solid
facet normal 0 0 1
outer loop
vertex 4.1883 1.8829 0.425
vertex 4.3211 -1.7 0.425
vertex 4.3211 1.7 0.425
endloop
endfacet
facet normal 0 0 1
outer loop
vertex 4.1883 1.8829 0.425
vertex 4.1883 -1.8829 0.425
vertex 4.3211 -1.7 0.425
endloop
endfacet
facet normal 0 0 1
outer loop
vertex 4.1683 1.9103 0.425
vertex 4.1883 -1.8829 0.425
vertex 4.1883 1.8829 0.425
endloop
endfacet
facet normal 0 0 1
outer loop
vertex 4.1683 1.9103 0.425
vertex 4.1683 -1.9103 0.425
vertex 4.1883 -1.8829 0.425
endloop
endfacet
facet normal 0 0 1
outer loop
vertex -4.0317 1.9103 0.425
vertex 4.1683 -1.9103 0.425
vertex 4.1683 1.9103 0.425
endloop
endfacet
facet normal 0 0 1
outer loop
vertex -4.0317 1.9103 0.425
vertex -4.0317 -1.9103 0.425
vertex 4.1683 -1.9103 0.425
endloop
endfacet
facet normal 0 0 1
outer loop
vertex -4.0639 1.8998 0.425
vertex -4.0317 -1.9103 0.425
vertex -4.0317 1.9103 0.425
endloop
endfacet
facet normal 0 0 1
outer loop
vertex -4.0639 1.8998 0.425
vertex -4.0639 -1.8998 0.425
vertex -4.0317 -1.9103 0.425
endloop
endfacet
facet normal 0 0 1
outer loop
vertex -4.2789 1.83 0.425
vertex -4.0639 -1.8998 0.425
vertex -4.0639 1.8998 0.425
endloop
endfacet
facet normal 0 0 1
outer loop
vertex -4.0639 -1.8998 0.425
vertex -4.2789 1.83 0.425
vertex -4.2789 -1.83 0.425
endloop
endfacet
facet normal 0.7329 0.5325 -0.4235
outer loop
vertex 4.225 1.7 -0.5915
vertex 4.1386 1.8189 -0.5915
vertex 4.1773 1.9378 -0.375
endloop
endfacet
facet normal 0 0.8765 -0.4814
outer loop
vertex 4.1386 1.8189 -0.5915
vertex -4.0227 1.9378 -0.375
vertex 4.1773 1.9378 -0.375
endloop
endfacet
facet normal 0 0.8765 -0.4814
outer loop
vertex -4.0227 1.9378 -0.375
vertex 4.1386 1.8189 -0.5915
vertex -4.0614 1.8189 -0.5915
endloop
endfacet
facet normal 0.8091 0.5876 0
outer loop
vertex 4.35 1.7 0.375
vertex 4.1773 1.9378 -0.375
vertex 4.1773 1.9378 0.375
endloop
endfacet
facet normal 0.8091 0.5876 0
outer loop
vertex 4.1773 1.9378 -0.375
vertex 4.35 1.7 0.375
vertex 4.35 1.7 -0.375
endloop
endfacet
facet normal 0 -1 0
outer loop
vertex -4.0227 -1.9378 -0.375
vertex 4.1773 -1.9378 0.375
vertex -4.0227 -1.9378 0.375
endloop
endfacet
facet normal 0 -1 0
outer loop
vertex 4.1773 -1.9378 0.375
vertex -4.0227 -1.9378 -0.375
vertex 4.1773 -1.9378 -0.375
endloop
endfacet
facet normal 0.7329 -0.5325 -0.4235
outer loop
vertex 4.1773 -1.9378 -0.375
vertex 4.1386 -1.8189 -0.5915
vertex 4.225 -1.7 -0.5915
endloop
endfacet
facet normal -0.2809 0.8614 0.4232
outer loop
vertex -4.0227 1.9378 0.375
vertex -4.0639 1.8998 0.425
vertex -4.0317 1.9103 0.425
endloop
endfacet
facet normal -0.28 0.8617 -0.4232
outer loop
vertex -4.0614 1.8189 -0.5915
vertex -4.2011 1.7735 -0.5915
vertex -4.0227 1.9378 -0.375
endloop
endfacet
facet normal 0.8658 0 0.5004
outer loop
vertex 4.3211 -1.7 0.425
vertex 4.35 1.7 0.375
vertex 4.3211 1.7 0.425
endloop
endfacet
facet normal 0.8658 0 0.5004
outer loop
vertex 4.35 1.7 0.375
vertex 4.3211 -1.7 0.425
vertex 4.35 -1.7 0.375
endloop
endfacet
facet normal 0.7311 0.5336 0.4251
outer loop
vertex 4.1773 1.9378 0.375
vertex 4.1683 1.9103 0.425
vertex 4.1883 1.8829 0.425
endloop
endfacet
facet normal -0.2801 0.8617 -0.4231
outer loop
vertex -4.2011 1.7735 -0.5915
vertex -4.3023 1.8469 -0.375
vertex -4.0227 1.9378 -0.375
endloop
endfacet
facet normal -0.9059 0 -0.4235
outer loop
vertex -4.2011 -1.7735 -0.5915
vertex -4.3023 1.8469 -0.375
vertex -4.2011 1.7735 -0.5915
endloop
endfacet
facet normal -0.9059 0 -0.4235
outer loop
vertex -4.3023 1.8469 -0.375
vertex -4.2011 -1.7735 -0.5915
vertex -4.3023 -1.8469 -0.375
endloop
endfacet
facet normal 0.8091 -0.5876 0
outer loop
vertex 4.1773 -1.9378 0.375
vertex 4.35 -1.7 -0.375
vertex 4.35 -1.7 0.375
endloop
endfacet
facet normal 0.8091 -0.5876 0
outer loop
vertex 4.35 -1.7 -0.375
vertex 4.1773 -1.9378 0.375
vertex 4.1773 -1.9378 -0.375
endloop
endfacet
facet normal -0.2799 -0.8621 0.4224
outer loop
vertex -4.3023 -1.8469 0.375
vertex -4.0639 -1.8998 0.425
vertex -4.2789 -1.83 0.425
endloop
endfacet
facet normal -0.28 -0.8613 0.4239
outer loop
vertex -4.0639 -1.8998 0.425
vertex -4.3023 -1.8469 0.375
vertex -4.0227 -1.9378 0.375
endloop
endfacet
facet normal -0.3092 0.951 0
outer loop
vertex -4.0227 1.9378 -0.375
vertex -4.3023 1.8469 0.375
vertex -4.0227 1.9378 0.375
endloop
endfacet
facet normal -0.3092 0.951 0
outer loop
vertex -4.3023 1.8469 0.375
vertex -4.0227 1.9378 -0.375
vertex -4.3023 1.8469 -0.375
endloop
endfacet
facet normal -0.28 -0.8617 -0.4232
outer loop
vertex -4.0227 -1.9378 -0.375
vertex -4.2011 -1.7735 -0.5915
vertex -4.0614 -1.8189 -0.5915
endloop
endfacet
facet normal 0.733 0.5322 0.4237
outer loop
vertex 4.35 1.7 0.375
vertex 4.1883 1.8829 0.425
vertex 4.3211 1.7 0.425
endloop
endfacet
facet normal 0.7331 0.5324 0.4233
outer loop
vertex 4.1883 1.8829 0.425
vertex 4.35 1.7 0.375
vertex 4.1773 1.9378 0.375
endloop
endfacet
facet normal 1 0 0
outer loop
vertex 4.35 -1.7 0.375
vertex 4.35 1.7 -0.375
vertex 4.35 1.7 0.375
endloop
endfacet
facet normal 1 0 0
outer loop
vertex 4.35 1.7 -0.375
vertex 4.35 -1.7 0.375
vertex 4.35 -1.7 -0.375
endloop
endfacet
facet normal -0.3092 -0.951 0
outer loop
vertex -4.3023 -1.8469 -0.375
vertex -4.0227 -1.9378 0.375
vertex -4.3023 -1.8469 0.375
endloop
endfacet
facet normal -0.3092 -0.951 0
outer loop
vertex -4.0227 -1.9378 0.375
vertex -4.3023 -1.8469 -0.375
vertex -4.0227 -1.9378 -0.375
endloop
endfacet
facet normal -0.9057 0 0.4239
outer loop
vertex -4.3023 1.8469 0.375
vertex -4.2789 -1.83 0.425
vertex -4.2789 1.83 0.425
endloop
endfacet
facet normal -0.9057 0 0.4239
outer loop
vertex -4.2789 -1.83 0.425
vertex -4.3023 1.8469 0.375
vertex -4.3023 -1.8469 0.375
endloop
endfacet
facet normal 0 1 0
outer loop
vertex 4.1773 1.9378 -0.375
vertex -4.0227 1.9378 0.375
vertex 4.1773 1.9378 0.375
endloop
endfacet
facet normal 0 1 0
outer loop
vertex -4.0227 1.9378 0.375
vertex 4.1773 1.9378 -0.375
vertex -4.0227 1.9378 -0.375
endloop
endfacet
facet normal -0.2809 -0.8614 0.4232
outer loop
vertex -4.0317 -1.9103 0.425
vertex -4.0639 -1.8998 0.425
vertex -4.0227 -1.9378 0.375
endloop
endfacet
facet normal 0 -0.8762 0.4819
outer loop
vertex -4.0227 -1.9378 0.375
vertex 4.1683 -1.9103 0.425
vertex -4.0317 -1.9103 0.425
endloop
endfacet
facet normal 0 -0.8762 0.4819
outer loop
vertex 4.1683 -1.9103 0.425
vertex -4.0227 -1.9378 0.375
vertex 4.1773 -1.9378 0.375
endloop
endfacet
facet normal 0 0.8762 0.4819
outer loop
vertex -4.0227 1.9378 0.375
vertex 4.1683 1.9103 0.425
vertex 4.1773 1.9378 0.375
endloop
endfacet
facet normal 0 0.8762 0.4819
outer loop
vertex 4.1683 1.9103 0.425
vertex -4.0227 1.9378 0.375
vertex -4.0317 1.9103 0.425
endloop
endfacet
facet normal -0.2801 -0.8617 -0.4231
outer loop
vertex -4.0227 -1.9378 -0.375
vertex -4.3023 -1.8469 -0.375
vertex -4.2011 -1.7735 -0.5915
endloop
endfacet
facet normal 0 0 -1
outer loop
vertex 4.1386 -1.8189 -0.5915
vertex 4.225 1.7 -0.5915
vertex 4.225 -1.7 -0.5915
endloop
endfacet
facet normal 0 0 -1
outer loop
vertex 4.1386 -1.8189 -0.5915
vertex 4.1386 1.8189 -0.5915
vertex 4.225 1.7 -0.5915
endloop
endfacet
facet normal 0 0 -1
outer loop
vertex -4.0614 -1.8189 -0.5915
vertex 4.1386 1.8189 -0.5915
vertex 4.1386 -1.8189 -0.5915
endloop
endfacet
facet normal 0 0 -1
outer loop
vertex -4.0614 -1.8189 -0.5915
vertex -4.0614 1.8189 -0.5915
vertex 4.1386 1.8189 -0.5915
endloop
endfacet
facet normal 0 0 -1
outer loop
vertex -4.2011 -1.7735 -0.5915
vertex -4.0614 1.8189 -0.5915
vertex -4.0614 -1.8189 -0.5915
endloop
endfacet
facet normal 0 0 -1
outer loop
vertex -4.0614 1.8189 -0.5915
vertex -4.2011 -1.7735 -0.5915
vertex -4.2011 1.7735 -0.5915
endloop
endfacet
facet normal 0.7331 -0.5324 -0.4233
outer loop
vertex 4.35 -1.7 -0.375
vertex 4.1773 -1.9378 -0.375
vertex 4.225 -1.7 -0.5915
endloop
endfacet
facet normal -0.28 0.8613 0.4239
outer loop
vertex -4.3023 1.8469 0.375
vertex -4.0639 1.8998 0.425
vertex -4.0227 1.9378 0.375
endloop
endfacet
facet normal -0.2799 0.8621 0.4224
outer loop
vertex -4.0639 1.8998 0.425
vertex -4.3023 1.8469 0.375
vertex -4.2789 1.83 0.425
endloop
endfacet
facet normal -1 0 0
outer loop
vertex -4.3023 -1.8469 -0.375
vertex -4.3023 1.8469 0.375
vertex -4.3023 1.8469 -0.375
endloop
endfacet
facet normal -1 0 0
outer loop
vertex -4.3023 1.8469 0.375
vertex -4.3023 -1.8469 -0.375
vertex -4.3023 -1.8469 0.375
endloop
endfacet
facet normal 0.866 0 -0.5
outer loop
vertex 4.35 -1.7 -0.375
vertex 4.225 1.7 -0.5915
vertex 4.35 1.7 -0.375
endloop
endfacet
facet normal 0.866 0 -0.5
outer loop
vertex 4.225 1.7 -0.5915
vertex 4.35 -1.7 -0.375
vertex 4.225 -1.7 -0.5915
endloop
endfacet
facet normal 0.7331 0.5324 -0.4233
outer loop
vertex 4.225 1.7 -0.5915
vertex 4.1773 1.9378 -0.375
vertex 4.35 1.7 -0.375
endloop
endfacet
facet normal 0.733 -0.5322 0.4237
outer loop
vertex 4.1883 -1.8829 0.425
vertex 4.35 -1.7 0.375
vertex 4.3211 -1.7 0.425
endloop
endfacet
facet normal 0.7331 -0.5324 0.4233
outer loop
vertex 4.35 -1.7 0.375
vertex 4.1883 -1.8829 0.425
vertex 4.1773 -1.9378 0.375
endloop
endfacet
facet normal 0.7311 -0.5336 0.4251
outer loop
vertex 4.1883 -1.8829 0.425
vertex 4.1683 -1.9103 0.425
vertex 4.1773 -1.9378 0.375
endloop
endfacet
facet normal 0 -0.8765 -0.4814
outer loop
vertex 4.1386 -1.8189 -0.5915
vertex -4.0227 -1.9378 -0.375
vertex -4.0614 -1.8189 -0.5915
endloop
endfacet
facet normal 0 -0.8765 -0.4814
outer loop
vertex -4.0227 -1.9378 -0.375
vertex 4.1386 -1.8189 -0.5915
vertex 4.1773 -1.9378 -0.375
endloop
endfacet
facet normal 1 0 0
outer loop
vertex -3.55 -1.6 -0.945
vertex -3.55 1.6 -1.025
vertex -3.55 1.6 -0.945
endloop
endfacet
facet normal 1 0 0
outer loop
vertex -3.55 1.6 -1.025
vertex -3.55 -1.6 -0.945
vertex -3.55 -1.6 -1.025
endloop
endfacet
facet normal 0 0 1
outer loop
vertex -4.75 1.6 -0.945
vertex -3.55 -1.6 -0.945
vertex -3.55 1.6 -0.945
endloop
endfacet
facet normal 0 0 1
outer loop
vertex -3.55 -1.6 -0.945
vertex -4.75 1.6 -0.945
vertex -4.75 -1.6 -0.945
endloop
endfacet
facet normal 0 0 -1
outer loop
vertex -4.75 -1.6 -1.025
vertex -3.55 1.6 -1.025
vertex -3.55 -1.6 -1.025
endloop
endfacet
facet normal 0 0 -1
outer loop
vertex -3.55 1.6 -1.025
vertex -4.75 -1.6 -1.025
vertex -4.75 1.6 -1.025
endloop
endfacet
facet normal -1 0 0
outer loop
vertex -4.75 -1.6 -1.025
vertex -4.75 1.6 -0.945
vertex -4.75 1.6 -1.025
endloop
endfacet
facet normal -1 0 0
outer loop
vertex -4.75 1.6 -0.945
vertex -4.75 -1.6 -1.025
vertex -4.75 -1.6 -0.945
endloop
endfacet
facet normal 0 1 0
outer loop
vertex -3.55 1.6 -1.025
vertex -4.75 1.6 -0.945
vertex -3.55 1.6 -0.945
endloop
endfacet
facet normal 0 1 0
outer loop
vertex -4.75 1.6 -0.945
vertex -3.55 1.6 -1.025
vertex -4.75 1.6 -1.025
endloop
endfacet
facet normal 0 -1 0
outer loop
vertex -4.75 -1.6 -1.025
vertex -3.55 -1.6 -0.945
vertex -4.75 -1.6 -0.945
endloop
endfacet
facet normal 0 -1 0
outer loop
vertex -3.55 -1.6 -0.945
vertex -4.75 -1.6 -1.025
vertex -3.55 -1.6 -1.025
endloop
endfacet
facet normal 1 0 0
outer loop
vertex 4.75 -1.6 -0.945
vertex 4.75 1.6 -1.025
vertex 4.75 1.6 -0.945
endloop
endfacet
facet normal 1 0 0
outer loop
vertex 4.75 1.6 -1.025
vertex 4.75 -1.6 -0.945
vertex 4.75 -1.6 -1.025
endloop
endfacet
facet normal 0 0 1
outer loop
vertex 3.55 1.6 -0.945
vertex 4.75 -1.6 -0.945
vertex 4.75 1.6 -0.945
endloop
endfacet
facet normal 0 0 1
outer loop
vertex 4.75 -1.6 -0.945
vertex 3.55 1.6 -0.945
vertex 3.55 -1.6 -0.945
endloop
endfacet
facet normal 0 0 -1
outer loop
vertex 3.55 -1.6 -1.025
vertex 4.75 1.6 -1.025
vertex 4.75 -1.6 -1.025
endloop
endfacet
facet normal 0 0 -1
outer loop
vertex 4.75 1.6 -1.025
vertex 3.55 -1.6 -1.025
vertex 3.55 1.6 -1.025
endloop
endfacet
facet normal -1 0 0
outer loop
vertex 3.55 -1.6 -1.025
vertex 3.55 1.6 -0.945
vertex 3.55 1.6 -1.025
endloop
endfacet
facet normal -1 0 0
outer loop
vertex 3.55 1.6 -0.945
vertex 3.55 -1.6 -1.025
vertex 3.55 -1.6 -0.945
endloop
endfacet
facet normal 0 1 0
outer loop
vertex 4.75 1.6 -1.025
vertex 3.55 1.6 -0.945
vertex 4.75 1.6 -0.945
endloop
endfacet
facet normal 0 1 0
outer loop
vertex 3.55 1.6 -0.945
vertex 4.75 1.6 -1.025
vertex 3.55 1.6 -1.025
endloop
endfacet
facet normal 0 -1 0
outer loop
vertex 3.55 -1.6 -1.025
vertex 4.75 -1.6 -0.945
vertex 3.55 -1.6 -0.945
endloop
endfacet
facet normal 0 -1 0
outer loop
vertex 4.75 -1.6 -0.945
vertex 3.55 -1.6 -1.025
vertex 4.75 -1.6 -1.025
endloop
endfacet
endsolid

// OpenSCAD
// Parameters
body_L = 8.7; //[4.35:17.4:0.05]
body_W = 3.9; //[1.95:7.8:0.05]
body_H = 1.25; //[0.625:2.5:0.05]
edge_fillet_r = 0.25; //[0.1:0.6:0.05]
top_chamfer = 0.2; //[0.05:0.5:0.05]
polarity_mark_r = 0.35; //[0.15:0.8:0.05]
polarity_mark_h = 0.08; //[0.03:0.2:0.01]
pad_L = 1.2; //[0.6:2.4:0.05]
pad_W = 3.2; //[1.6:3.9:0.05]
pad_T = 0.08; //[0.03:0.2:0.01]
overlap = 0.8; //[0.5:2.0:0.1]

// Base shapes
module smd_body_core_box() {
  cube([body_L - 2*edge_fillet_r, body_W - 2*edge_fillet_r, body_H - 2*edge_fillet_r], center=true);
}

module side_fillet_sphere() {
  sphere(r=edge_fillet_r, center=true);
}

module top_chamfer_cut_box() {
  translate([0, 0, body_H/2 - top_chamfer/2])
    cube([body_L + 2*overlap, body_W + 2*overlap, top_chamfer], center=true);
}

module top_chamfer_cut_wedge() {
  translate([0, 0, body_H/2 - top_chamfer])
    rotate([90, 0, 0])
      linear_extrude(height=body_W + 2*overlap, center=true)
        polygon(points=[
          [-(body_L/2 + overlap), 0],
          [(body_L/2 + overlap), 0],
          [(body_L/2 + overlap), top_chamfer],
          [-(body_L/2 + overlap), top_chamfer]
        ]);
}

module polarity_mark_cyl() {
  translate([-(body_L/2 - polarity_mark_r - overlap/2), (body_W/2 - polarity_mark_r - overlap/2), body_H/2 + polarity_mark_h/2 - overlap/2])
    cylinder(r=polarity_mark_r, h=polarity_mark_h, center=true);
}

module metal_pad_left() {
  translate([-(body_L/2 - pad_L/2 + overlap/2), 0, -(body_H/2 - pad_T/2 + overlap/2)])
    cube([pad_L, pad_W, pad_T], center=true);
}

module metal_pad_right() {
  translate([(body_L/2 - pad_L/2 + overlap/2), 0, -(body_H/2 - pad_T/2 + overlap/2)])
    cube([pad_L, pad_W, pad_T], center=true);
}

// Operations
module side_fillet_minkowski() {
  minkowski() {
    smd_body_core_box();
    side_fillet_sphere();
  }
}

module top_chamfer_cut_union() {
  union() {
    top_chamfer_cut_box();
    top_chamfer_cut_wedge();
  }
}

module smd_body() {
  difference() {
    side_fillet_minkowski();
    top_chamfer_cut_union();
  }
}

module metal_pads() {
  union() {
    metal_pad_left();
    metal_pad_right();
  }
}

// Final model
module complete_model() {
  union() {
    smd_body();
    polarity_mark_cyl();
    metal_pads();
  }
}

// Render the complete model
complete_model();
